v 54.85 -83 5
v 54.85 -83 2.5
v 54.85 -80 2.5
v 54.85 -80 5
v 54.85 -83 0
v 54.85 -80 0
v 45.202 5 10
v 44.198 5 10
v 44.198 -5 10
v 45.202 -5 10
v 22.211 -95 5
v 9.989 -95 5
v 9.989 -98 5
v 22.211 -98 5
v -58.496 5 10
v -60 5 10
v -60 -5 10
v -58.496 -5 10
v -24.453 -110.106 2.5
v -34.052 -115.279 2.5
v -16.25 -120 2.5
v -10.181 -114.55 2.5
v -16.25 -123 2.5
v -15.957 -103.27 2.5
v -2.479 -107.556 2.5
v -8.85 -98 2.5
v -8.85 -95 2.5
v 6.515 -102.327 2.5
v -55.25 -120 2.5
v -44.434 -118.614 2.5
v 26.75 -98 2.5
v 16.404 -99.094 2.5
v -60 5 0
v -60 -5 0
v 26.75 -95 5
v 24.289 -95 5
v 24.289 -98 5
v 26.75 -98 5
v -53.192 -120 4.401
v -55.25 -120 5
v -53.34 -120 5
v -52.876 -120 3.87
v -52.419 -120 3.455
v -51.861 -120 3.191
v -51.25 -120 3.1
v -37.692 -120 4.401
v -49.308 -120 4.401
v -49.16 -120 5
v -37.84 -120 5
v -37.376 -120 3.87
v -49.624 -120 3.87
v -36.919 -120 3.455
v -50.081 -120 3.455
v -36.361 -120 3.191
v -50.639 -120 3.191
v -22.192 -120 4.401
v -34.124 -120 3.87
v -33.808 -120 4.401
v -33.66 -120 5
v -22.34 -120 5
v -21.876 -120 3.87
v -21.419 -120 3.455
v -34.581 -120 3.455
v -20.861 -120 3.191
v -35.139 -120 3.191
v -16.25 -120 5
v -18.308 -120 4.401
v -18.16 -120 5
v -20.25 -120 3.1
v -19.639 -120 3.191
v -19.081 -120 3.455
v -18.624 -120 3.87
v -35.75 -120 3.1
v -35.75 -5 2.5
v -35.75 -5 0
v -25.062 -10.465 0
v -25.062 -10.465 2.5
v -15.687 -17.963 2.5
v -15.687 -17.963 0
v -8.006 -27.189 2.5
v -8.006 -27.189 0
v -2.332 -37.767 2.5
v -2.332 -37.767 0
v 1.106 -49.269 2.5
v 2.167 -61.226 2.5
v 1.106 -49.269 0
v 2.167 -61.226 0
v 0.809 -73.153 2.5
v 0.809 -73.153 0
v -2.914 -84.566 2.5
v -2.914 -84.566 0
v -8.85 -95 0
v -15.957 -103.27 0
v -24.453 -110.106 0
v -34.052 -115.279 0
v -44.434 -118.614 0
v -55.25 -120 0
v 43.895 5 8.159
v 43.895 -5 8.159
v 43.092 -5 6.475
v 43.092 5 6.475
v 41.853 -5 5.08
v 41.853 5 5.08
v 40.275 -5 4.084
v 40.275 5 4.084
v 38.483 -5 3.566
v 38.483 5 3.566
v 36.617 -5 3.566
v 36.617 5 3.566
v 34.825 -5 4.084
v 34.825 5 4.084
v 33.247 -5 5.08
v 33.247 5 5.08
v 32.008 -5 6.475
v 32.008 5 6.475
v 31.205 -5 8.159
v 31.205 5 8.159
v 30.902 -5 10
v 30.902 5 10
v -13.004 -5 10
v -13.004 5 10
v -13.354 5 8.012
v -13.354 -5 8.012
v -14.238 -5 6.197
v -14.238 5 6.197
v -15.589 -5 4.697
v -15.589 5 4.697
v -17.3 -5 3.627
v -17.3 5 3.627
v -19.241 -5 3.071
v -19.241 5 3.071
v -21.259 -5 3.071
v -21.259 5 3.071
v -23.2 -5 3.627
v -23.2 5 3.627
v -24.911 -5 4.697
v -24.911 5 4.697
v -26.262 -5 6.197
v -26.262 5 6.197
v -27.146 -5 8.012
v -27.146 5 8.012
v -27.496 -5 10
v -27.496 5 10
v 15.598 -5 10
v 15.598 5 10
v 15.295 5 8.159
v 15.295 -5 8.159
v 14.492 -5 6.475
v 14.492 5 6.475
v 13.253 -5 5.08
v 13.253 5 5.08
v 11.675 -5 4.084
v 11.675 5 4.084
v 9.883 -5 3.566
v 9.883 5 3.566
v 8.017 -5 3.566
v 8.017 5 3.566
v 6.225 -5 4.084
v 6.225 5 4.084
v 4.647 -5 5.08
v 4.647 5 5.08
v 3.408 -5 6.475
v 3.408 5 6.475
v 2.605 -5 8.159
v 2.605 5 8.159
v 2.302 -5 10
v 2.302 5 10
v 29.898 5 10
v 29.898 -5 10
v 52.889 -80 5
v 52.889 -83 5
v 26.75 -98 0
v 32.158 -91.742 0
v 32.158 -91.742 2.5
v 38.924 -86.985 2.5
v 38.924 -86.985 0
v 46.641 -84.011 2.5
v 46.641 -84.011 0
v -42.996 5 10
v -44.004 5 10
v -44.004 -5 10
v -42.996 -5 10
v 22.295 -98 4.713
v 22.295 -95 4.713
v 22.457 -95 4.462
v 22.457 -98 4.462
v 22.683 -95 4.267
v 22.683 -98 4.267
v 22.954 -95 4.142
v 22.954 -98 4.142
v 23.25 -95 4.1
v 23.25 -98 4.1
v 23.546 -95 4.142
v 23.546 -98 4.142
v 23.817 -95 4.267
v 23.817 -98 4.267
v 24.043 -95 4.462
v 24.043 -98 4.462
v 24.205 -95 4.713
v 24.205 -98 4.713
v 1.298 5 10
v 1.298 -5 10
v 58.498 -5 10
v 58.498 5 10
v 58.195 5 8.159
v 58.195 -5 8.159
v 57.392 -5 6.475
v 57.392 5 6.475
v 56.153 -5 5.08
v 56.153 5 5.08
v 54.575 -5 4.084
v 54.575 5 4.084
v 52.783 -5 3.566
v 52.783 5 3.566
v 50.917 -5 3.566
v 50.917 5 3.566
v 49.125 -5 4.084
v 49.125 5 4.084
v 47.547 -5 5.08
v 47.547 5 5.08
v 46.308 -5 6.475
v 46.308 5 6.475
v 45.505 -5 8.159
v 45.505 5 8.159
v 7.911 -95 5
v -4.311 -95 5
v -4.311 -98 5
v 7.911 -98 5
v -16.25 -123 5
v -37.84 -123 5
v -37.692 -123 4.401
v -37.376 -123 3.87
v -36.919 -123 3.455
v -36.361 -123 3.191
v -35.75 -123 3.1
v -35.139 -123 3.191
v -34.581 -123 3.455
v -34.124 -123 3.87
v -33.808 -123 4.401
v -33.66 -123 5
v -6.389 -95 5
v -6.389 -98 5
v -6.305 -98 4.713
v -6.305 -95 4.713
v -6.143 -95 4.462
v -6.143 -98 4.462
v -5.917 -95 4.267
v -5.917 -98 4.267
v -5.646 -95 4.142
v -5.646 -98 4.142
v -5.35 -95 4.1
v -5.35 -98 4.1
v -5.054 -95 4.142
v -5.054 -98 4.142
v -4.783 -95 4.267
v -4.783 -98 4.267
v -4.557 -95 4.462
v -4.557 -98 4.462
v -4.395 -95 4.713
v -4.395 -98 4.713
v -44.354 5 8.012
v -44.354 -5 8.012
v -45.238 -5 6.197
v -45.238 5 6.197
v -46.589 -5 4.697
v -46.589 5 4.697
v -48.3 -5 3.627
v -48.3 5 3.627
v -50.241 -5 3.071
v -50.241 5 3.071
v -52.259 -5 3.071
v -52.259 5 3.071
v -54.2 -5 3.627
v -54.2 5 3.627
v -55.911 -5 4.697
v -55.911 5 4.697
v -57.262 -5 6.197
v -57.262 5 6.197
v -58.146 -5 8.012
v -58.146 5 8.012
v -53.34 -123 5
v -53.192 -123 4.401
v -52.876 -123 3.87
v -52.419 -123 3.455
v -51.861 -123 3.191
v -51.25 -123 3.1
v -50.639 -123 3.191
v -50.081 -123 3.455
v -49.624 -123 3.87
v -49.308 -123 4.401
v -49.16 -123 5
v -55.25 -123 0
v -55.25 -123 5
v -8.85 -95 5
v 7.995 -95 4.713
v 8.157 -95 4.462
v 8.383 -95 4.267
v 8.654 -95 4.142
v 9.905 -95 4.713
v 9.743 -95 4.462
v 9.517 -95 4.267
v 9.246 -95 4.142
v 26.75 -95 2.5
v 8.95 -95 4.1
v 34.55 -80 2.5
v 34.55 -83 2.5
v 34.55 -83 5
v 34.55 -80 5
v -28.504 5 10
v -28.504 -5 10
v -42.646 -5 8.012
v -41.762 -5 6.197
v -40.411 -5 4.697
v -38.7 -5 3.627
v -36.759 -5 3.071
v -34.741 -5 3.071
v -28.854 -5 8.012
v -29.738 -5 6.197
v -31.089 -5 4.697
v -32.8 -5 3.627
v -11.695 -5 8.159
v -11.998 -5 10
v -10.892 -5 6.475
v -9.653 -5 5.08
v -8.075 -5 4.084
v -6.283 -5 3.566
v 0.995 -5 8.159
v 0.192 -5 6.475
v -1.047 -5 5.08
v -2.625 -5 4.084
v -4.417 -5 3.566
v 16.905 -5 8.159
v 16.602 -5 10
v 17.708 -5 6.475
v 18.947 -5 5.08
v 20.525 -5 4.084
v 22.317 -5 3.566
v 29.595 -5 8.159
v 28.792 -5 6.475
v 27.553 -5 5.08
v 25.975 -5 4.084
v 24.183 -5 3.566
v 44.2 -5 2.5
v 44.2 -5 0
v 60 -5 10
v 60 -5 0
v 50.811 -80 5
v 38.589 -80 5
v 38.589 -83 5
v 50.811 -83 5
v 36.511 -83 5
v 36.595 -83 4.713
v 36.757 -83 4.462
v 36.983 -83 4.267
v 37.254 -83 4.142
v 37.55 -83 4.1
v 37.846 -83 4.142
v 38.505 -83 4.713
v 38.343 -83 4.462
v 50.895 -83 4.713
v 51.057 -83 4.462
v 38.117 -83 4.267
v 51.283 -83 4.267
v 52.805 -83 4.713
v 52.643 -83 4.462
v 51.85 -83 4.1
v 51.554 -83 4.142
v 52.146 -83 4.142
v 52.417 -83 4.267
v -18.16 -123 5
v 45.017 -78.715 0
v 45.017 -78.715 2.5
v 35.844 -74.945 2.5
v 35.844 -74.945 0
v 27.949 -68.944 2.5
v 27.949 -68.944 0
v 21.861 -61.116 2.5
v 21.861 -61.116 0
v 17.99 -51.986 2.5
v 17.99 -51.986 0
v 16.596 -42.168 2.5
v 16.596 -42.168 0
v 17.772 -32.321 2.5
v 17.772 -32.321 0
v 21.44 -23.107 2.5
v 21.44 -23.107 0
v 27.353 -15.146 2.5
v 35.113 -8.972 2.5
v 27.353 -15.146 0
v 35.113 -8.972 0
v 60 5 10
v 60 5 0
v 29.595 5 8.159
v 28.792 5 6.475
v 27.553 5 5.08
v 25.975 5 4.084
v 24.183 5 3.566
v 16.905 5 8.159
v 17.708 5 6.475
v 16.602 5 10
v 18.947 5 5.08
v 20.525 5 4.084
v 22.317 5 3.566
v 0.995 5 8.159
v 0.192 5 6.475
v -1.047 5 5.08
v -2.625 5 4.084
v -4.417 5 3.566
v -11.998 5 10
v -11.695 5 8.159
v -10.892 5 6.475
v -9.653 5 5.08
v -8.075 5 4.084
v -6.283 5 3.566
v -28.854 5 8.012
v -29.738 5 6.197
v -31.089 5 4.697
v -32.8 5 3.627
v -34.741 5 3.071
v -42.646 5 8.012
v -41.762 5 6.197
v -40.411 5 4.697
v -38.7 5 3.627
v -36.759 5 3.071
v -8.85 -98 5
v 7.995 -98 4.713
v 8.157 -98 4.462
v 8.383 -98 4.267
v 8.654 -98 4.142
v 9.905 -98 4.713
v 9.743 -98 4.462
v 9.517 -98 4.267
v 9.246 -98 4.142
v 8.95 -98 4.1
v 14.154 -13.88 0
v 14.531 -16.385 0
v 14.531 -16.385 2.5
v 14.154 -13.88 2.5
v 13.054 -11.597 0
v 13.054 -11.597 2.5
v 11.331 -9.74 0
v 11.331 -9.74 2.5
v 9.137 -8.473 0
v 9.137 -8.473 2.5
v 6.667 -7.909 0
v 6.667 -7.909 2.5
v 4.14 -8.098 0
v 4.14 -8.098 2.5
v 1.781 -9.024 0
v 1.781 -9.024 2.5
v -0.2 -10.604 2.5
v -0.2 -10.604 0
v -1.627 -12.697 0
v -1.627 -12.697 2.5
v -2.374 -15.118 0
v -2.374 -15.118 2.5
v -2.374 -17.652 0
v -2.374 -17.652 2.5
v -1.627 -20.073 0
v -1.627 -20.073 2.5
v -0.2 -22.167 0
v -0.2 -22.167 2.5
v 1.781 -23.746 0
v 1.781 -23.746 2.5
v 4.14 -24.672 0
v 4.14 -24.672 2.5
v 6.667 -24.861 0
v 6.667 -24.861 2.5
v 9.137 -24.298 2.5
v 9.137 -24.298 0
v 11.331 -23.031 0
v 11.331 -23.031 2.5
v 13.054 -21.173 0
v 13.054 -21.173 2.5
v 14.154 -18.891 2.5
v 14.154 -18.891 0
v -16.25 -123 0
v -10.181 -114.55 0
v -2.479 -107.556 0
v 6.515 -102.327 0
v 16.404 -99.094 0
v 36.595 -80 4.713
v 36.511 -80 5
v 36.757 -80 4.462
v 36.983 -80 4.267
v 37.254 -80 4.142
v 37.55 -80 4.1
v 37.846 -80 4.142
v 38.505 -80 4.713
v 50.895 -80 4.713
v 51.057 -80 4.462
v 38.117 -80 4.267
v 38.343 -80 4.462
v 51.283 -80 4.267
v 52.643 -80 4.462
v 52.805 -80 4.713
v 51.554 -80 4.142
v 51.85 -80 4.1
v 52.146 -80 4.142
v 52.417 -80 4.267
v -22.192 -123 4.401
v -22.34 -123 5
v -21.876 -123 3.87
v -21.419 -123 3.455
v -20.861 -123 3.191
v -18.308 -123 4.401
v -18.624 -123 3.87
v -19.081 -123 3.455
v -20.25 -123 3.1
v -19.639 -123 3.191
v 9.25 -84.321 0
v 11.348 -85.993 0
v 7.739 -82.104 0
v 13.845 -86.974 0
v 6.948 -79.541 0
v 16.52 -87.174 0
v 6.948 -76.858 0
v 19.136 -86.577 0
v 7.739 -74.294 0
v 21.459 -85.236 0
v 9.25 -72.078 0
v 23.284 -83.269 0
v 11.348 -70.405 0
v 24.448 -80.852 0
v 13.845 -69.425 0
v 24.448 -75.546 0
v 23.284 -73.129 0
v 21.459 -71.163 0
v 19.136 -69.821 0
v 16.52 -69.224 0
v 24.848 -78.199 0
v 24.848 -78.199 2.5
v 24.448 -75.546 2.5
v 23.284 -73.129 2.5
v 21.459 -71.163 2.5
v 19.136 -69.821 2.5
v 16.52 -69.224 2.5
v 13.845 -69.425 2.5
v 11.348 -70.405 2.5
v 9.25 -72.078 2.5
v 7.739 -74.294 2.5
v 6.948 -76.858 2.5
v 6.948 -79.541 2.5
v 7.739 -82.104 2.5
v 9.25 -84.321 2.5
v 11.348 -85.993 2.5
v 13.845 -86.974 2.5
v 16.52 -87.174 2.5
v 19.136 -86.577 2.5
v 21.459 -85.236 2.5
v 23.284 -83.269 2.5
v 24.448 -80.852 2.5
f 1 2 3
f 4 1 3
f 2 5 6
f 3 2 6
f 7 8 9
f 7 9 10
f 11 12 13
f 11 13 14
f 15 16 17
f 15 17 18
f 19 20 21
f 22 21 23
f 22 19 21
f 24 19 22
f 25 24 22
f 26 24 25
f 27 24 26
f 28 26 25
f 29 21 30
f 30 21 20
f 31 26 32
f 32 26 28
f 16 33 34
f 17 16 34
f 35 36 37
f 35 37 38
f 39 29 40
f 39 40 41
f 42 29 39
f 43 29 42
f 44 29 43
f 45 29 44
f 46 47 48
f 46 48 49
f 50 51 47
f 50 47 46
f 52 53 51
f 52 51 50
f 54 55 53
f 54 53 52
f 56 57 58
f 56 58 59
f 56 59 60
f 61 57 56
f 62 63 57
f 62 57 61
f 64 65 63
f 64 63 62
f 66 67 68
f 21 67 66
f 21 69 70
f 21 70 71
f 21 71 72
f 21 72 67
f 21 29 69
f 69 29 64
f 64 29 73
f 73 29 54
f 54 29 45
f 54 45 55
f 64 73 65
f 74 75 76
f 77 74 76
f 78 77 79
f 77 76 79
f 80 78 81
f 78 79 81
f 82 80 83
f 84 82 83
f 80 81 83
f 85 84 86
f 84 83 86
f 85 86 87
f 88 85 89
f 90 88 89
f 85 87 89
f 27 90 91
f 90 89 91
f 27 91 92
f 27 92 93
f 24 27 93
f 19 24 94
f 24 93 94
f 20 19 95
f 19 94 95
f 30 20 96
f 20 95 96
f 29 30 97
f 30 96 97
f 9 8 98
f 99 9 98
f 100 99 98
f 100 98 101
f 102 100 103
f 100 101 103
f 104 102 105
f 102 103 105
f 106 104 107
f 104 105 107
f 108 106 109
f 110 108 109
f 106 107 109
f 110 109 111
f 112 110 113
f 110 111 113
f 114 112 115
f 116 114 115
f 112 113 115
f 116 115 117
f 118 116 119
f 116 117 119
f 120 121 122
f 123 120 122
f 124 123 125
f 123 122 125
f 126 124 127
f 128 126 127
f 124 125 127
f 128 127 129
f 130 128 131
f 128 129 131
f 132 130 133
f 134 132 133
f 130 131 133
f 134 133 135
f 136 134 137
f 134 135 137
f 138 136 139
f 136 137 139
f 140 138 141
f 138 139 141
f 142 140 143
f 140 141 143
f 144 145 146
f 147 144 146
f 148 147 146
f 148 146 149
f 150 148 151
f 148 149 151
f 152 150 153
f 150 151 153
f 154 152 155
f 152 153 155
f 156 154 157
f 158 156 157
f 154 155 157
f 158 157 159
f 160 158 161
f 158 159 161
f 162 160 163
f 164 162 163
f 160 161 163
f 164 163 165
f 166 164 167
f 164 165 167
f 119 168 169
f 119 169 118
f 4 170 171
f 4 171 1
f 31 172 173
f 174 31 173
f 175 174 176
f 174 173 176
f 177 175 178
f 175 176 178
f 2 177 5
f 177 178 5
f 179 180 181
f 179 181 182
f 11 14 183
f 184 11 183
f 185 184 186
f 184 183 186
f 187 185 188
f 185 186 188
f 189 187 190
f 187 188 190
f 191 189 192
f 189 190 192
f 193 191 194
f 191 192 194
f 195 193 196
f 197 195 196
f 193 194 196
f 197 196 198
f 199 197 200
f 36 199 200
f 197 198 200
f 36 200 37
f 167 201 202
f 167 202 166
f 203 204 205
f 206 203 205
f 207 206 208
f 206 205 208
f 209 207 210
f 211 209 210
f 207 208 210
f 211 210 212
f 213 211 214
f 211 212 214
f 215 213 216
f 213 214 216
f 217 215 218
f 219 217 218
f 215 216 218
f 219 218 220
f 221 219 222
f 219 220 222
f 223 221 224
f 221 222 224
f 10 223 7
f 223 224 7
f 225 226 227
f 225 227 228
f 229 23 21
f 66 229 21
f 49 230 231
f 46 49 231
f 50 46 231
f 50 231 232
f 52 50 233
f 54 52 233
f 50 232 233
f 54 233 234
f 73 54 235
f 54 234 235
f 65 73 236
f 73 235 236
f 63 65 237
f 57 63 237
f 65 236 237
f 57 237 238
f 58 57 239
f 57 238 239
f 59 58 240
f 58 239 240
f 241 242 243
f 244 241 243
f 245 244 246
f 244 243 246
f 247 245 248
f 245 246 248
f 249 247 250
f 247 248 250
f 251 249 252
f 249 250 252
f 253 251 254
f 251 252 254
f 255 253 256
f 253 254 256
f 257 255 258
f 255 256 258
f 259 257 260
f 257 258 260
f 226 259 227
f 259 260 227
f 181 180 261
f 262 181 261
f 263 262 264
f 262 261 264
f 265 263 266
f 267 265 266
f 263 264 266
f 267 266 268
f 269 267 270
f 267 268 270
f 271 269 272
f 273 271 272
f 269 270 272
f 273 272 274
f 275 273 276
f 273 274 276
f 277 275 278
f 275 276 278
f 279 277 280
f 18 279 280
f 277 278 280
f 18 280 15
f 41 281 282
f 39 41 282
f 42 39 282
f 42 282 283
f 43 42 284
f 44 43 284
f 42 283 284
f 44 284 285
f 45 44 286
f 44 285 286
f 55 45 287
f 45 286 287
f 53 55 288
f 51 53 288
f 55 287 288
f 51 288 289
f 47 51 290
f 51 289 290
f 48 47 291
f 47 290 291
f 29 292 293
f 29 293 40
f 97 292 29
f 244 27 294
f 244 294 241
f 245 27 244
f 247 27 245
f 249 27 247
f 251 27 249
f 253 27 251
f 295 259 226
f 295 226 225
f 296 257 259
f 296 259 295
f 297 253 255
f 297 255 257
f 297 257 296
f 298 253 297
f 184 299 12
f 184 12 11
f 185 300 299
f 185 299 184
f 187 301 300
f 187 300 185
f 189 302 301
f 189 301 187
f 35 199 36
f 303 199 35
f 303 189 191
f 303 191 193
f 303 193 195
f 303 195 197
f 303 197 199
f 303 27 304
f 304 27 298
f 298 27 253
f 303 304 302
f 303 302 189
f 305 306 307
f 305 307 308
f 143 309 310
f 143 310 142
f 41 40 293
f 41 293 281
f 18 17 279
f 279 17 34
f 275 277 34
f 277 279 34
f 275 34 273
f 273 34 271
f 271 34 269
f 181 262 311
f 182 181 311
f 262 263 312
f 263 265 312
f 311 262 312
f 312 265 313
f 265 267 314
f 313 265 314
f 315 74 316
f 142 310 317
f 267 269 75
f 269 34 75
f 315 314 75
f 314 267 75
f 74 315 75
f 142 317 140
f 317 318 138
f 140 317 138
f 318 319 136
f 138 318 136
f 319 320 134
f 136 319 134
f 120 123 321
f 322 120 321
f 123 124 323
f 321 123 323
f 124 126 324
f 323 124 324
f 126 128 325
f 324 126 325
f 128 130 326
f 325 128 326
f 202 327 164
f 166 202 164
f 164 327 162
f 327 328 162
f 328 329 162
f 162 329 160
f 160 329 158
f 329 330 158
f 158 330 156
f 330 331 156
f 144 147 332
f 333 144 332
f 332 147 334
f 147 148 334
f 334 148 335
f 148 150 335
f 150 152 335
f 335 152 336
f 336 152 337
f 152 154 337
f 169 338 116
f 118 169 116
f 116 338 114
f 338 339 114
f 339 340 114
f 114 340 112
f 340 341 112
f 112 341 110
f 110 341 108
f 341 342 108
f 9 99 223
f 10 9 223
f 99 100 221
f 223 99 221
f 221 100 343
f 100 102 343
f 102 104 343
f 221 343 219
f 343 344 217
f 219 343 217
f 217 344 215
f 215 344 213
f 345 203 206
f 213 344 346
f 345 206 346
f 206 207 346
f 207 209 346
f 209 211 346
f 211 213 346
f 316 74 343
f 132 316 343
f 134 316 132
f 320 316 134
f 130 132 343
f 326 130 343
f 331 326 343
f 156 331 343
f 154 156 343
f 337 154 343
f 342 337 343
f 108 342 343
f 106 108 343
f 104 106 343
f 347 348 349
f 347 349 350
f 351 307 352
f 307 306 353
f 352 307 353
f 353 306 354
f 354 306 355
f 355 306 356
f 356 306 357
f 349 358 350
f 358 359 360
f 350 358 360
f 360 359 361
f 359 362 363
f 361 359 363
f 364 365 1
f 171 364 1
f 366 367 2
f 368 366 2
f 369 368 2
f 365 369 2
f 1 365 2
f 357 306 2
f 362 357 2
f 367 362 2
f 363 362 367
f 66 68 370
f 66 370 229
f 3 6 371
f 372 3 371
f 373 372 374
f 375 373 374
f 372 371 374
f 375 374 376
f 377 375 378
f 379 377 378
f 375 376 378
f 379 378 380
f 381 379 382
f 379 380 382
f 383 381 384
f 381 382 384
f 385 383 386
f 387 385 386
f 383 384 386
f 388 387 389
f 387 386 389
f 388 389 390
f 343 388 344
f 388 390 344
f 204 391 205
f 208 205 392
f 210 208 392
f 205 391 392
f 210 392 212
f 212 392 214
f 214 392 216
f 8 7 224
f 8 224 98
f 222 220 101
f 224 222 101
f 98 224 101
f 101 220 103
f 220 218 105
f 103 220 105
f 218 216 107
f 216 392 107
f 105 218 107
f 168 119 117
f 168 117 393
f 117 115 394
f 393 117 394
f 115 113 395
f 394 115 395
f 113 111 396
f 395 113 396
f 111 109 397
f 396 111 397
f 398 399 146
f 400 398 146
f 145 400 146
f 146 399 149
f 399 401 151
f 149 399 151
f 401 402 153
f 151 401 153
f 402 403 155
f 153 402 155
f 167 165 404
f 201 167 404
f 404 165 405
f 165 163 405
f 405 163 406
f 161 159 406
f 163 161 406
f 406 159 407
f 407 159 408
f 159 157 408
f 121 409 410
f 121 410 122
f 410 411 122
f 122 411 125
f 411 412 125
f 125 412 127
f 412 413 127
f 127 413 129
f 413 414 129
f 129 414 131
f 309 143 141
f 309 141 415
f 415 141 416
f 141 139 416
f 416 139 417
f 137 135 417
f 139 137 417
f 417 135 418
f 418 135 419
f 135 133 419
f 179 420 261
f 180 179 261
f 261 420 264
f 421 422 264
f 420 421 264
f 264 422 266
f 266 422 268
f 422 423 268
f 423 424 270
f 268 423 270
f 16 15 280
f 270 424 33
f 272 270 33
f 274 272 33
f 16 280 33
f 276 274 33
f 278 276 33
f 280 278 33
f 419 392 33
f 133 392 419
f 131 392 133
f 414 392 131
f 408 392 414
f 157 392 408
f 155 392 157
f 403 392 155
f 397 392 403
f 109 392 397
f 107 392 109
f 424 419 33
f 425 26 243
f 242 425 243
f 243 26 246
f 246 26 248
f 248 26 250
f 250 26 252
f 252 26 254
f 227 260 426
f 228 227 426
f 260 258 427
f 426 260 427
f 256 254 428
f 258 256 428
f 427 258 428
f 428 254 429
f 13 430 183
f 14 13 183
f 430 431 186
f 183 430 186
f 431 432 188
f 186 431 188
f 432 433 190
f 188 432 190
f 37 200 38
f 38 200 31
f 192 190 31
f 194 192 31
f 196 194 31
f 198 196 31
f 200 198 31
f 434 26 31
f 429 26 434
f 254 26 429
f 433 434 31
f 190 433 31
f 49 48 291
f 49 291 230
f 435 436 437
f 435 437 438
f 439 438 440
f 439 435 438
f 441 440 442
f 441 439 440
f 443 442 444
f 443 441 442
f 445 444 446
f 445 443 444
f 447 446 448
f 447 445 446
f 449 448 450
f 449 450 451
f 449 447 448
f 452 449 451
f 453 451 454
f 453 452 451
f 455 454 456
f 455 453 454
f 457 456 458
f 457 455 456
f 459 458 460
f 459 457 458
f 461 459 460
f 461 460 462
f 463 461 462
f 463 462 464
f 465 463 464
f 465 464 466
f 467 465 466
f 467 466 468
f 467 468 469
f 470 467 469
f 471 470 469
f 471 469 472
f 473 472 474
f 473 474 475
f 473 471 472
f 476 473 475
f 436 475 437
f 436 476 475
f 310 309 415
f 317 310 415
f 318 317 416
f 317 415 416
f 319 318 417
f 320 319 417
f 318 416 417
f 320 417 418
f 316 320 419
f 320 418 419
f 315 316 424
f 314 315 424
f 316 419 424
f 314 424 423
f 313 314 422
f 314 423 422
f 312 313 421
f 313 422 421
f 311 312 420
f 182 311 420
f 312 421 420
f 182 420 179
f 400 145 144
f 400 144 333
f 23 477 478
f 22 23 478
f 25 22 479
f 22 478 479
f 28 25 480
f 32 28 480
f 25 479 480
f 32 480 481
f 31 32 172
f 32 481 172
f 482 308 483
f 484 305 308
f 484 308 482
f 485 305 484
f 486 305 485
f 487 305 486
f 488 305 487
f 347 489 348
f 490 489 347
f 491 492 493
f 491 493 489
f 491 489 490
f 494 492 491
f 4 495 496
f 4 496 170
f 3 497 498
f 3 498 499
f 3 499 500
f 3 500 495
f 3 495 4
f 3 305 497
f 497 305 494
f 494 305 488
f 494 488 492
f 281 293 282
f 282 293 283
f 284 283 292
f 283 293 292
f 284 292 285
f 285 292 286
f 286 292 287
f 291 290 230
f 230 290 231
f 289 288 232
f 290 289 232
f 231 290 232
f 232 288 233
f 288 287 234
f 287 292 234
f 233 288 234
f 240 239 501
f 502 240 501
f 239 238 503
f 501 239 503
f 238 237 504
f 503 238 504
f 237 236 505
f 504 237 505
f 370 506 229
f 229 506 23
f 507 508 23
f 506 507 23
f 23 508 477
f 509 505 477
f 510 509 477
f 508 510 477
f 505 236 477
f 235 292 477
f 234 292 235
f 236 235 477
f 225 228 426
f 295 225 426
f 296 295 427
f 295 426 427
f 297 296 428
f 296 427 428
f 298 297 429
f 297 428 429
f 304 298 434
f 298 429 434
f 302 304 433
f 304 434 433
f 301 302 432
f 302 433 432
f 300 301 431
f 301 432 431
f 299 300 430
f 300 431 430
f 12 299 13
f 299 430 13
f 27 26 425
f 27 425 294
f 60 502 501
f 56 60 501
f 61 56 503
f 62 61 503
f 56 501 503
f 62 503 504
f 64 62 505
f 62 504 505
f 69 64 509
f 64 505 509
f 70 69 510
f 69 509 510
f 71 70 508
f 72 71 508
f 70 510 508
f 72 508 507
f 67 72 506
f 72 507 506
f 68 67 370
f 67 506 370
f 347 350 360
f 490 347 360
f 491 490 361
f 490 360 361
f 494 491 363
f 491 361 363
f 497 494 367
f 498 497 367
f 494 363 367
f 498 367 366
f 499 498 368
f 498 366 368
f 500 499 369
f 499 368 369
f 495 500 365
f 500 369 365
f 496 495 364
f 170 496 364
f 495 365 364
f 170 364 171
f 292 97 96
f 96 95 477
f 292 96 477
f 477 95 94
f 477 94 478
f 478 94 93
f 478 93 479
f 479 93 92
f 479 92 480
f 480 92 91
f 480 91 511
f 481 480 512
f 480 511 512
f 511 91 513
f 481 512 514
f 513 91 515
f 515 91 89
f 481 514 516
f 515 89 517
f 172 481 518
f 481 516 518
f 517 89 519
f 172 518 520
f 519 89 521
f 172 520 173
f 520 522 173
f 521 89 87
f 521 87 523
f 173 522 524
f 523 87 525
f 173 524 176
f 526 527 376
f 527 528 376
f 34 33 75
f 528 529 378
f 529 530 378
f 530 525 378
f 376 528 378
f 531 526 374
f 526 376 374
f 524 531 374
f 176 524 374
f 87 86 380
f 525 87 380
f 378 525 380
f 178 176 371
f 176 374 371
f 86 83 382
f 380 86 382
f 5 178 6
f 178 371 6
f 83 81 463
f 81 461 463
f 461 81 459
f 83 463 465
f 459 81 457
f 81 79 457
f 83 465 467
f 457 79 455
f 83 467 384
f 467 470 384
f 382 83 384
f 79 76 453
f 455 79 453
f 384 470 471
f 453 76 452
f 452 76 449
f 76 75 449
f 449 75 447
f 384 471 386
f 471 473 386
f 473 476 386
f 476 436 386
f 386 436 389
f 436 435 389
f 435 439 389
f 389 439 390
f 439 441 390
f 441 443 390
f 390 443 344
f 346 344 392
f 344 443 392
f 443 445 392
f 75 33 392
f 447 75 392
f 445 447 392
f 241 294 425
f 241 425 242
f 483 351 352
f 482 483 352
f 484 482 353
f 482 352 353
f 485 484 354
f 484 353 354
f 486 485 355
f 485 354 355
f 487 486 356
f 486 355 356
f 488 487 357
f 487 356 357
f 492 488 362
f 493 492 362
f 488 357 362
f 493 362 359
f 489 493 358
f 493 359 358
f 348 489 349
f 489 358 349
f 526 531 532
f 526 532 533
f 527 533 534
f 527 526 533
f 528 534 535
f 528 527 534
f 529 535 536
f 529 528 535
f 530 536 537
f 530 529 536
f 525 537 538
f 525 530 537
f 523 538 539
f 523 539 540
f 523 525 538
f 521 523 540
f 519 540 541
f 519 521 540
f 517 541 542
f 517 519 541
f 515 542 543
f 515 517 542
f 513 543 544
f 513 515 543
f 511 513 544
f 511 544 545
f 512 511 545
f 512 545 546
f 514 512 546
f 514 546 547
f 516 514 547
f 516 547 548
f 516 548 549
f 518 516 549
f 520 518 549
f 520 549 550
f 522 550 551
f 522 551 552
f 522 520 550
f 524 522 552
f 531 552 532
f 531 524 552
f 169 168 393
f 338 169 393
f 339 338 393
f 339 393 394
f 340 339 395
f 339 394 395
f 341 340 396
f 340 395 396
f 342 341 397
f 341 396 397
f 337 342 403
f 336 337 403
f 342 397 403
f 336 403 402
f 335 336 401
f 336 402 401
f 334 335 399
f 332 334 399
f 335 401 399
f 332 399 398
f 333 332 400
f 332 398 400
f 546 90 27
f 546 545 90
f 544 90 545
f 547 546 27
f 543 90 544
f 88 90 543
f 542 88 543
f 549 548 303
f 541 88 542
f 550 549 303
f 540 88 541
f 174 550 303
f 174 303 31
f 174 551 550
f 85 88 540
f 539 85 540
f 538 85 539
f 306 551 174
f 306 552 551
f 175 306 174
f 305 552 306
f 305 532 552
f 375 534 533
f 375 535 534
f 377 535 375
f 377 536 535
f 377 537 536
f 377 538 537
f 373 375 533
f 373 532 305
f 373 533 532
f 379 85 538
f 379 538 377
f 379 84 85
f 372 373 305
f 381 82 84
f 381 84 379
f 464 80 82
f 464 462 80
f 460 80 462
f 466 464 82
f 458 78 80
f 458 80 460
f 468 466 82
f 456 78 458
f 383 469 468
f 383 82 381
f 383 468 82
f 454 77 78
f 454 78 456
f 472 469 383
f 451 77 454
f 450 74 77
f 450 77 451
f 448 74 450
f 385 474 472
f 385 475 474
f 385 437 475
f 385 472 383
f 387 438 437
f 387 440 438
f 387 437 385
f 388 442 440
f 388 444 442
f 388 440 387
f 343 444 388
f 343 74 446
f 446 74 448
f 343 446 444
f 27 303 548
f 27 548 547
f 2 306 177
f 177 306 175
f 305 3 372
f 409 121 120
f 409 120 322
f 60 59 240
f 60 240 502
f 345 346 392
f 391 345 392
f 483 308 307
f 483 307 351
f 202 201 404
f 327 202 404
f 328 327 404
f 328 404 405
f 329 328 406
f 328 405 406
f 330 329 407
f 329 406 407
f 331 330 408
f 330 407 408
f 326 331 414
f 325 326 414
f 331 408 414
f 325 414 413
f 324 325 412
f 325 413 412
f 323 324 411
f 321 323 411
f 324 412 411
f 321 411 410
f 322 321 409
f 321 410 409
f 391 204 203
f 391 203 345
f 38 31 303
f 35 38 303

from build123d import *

# Parameters (mm, degrees)
F1_DEPTH = 10
F0_R     = 9
F0_R_2   = 8.5
F0_W     = 35.6
F0_H     = 3
F2_DEPTH = 2.5
F0_W_2   = 39
F0_W_3   = 20.3
F3_DEPTH = 5
F5_DEPTH = 10
F7_DEPTH = 43


with BuildPart() as f1:
    # F0 (on Top) → F1 (new body)
    with BuildSketch(Plane.XY):
        Polygon((-60, 5), (-60, -5), (-35.75, -5), (44.2, -5), (60, -5), (60, 5), (58.5, 5), (45.2, 5), (44.2, 5), (30.9, 5), (29.9, 5), (16.6, 5), (15.6, 5), (2.3, 5), (1.3, 5), (-12, 5), (-13, 5), (-27.5, 5), (-28.5, 5), (-43, 5), (-44, 5), (-58.5, 5), align=None)
    extrude(amount=F1_DEPTH)

    # F0 (on Top) → F2 (join)
    with BuildSketch(Plane.XY):
        with BuildLine():
            Line((44.2, -5), (-35.75, -5))
            ThreePointArc((-35.75, -5), (-0.3225250219, -43.4311769232), (-8.85, -95))
            Line((-8.85, -95), (26.75, -95))
            Line((26.75, -95), (26.75, -98))
            ThreePointArc((26.75, -98), (38.9235283255, -86.984743063), (54.85, -83))
            Line((54.85, -83), (34.55, -83))
            Line((34.55, -83), (34.55, -80))
            Line((34.55, -80), (54.85, -80))
            ThreePointArc((54.85, -80), (16.9738118998, -47.1222687102), (44.2, -5))
        make_face()
        with Locations((15.8479269594, -78.1992301345)):
            Circle(F0_R, mode=Mode.SUBTRACT)
        with Locations((6.0314284638, -16.3851659745)):
            Circle(F0_R_2, mode=Mode.SUBTRACT)
        with BuildLine():
            Line((-8.85, -98), (-8.85, -95))
            ThreePointArc((-8.85, -95), (-29.1337234425, -112.9126092907), (-55.25, -120))
            Line((-55.25, -120), (-16.25, -120))
            Line((-16.25, -120), (-16.25, -123))
            ThreePointArc((-16.25, -123), (1.8803397691, -104.7041844029), (26.75, -98))
            Line((26.75, -98), (-8.85, -98))
        make_face()
        with Locations((8.95, -96.5)):
            Rectangle(F0_W, F0_H)
    extrude(amount=F2_DEPTH)

    # F0 (on Top) → F3 (join)
    with BuildSketch(Plane.XY):
        with Locations((-35.75, -121.5)):
            Rectangle(F0_W_2, F0_H)
        with Locations((8.95, -96.5)):
            Rectangle(F0_W, F0_H)
        with Locations((44.7, -81.5)):
            Rectangle(F0_W_3, F0_H)
    extrude(amount=F3_DEPTH)

    # F4 (on face) → F5 (cut, through all)
    with BuildSketch(Plane(origin=(0, 5, 0), x_dir=(-1, 0, 0), z_dir=(0, 1, 0))):
        with BuildLine():
            Line((-45.2016919446, 10), (-58.4983080554, 10))
            ThreePointArc((-58.4983080554, 10), (-51.85, 3.5), (-45.2016919446, 10))
        make_face()
        with BuildLine():
            Line((-30.9016919446, 10), (-44.1983080554, 10))
            ThreePointArc((-44.1983080554, 10), (-37.55, 3.5), (-30.9016919446, 10))
        make_face()
        with BuildLine():
            Line((-16.6016919446, 10), (-29.8983080554, 10))
            ThreePointArc((-29.8983080554, 10), (-23.25, 3.5), (-16.6016919446, 10))
        make_face()
        with BuildLine():
            ThreePointArc((-15.5983080554, 10), (-8.95, 3.5), (-2.3016919446, 10))
            Line((-2.3016919446, 10), (-15.5983080554, 10))
        make_face()
        with BuildLine():
            ThreePointArc((-1.2983080554, 10), (5.35, 3.5), (11.9983080554, 10))
            Line((11.9983080554, 10), (-1.2983080554, 10))
        make_face()
        with BuildLine():
            ThreePointArc((13.0043116269, 10), (20.25, 3), (27.4956883731, 10))
            Line((27.4956883731, 10), (13.0043116269, 10))
        make_face()
        with BuildLine():
            ThreePointArc((28.5043116269, 10), (35.75, 3), (42.9956883731, 10))
            Line((42.9956883731, 10), (28.5043116269, 10))
        make_face()
        with BuildLine():
            ThreePointArc((44.0043116269, 10), (51.25, 3), (58.4956883731, 10))
            Line((58.4956883731, 10), (44.0043116269, 10))
        make_face()
    extrude(amount=-F5_DEPTH, mode=Mode.SUBTRACT)

    # F6 (on face) → F7 (cut, through all)
    with BuildSketch(Plane.XZ.offset(123)):
        with BuildLine():
            Line((-49.159545504, 5), (-53.340454496, 5))
            ThreePointArc((-53.340454496, 5), (-51.25, 3.1), (-49.159545504, 5))
        make_face()
        with BuildLine():
            Line((-33.659545504, 5), (-37.840454496, 5))
            ThreePointArc((-37.840454496, 5), (-35.75, 3.1), (-33.659545504, 5))
        make_face()
        with BuildLine():
            ThreePointArc((-22.340454496, 5), (-20.25, 3.1), (-18.159545504, 5))
            Line((-18.159545504, 5), (-22.340454496, 5))
        make_face()
        with BuildLine():
            Line((-4.3107695155, 5), (-6.3892304845, 5))
            ThreePointArc((-6.3892304845, 5), (-5.35, 4.1), (-4.3107695155, 5))
        make_face()
        with BuildLine():
            ThreePointArc((7.9107695155, 5), (8.95, 4.1), (9.9892304845, 5))
            Line((9.9892304845, 5), (7.9107695155, 5))
        make_face()
        with BuildLine():
            ThreePointArc((22.2107695155, 5), (23.25, 4.1), (24.2892304845, 5))
            Line((24.2892304845, 5), (22.2107695155, 5))
        make_face()
        with BuildLine():
            Line((38.5892304845, 5), (36.5107695155, 5))
            ThreePointArc((36.5107695155, 5), (37.55, 4.1), (38.5892304845, 5))
        make_face()
        with BuildLine():
            Line((52.8892304845, 5), (50.8107695155, 5))
            ThreePointArc((50.8107695155, 5), (51.85, 4.1), (52.8892304845, 5))
        make_face()
    extrude(amount=-F7_DEPTH, mode=Mode.SUBTRACT)


solid = f1.part
